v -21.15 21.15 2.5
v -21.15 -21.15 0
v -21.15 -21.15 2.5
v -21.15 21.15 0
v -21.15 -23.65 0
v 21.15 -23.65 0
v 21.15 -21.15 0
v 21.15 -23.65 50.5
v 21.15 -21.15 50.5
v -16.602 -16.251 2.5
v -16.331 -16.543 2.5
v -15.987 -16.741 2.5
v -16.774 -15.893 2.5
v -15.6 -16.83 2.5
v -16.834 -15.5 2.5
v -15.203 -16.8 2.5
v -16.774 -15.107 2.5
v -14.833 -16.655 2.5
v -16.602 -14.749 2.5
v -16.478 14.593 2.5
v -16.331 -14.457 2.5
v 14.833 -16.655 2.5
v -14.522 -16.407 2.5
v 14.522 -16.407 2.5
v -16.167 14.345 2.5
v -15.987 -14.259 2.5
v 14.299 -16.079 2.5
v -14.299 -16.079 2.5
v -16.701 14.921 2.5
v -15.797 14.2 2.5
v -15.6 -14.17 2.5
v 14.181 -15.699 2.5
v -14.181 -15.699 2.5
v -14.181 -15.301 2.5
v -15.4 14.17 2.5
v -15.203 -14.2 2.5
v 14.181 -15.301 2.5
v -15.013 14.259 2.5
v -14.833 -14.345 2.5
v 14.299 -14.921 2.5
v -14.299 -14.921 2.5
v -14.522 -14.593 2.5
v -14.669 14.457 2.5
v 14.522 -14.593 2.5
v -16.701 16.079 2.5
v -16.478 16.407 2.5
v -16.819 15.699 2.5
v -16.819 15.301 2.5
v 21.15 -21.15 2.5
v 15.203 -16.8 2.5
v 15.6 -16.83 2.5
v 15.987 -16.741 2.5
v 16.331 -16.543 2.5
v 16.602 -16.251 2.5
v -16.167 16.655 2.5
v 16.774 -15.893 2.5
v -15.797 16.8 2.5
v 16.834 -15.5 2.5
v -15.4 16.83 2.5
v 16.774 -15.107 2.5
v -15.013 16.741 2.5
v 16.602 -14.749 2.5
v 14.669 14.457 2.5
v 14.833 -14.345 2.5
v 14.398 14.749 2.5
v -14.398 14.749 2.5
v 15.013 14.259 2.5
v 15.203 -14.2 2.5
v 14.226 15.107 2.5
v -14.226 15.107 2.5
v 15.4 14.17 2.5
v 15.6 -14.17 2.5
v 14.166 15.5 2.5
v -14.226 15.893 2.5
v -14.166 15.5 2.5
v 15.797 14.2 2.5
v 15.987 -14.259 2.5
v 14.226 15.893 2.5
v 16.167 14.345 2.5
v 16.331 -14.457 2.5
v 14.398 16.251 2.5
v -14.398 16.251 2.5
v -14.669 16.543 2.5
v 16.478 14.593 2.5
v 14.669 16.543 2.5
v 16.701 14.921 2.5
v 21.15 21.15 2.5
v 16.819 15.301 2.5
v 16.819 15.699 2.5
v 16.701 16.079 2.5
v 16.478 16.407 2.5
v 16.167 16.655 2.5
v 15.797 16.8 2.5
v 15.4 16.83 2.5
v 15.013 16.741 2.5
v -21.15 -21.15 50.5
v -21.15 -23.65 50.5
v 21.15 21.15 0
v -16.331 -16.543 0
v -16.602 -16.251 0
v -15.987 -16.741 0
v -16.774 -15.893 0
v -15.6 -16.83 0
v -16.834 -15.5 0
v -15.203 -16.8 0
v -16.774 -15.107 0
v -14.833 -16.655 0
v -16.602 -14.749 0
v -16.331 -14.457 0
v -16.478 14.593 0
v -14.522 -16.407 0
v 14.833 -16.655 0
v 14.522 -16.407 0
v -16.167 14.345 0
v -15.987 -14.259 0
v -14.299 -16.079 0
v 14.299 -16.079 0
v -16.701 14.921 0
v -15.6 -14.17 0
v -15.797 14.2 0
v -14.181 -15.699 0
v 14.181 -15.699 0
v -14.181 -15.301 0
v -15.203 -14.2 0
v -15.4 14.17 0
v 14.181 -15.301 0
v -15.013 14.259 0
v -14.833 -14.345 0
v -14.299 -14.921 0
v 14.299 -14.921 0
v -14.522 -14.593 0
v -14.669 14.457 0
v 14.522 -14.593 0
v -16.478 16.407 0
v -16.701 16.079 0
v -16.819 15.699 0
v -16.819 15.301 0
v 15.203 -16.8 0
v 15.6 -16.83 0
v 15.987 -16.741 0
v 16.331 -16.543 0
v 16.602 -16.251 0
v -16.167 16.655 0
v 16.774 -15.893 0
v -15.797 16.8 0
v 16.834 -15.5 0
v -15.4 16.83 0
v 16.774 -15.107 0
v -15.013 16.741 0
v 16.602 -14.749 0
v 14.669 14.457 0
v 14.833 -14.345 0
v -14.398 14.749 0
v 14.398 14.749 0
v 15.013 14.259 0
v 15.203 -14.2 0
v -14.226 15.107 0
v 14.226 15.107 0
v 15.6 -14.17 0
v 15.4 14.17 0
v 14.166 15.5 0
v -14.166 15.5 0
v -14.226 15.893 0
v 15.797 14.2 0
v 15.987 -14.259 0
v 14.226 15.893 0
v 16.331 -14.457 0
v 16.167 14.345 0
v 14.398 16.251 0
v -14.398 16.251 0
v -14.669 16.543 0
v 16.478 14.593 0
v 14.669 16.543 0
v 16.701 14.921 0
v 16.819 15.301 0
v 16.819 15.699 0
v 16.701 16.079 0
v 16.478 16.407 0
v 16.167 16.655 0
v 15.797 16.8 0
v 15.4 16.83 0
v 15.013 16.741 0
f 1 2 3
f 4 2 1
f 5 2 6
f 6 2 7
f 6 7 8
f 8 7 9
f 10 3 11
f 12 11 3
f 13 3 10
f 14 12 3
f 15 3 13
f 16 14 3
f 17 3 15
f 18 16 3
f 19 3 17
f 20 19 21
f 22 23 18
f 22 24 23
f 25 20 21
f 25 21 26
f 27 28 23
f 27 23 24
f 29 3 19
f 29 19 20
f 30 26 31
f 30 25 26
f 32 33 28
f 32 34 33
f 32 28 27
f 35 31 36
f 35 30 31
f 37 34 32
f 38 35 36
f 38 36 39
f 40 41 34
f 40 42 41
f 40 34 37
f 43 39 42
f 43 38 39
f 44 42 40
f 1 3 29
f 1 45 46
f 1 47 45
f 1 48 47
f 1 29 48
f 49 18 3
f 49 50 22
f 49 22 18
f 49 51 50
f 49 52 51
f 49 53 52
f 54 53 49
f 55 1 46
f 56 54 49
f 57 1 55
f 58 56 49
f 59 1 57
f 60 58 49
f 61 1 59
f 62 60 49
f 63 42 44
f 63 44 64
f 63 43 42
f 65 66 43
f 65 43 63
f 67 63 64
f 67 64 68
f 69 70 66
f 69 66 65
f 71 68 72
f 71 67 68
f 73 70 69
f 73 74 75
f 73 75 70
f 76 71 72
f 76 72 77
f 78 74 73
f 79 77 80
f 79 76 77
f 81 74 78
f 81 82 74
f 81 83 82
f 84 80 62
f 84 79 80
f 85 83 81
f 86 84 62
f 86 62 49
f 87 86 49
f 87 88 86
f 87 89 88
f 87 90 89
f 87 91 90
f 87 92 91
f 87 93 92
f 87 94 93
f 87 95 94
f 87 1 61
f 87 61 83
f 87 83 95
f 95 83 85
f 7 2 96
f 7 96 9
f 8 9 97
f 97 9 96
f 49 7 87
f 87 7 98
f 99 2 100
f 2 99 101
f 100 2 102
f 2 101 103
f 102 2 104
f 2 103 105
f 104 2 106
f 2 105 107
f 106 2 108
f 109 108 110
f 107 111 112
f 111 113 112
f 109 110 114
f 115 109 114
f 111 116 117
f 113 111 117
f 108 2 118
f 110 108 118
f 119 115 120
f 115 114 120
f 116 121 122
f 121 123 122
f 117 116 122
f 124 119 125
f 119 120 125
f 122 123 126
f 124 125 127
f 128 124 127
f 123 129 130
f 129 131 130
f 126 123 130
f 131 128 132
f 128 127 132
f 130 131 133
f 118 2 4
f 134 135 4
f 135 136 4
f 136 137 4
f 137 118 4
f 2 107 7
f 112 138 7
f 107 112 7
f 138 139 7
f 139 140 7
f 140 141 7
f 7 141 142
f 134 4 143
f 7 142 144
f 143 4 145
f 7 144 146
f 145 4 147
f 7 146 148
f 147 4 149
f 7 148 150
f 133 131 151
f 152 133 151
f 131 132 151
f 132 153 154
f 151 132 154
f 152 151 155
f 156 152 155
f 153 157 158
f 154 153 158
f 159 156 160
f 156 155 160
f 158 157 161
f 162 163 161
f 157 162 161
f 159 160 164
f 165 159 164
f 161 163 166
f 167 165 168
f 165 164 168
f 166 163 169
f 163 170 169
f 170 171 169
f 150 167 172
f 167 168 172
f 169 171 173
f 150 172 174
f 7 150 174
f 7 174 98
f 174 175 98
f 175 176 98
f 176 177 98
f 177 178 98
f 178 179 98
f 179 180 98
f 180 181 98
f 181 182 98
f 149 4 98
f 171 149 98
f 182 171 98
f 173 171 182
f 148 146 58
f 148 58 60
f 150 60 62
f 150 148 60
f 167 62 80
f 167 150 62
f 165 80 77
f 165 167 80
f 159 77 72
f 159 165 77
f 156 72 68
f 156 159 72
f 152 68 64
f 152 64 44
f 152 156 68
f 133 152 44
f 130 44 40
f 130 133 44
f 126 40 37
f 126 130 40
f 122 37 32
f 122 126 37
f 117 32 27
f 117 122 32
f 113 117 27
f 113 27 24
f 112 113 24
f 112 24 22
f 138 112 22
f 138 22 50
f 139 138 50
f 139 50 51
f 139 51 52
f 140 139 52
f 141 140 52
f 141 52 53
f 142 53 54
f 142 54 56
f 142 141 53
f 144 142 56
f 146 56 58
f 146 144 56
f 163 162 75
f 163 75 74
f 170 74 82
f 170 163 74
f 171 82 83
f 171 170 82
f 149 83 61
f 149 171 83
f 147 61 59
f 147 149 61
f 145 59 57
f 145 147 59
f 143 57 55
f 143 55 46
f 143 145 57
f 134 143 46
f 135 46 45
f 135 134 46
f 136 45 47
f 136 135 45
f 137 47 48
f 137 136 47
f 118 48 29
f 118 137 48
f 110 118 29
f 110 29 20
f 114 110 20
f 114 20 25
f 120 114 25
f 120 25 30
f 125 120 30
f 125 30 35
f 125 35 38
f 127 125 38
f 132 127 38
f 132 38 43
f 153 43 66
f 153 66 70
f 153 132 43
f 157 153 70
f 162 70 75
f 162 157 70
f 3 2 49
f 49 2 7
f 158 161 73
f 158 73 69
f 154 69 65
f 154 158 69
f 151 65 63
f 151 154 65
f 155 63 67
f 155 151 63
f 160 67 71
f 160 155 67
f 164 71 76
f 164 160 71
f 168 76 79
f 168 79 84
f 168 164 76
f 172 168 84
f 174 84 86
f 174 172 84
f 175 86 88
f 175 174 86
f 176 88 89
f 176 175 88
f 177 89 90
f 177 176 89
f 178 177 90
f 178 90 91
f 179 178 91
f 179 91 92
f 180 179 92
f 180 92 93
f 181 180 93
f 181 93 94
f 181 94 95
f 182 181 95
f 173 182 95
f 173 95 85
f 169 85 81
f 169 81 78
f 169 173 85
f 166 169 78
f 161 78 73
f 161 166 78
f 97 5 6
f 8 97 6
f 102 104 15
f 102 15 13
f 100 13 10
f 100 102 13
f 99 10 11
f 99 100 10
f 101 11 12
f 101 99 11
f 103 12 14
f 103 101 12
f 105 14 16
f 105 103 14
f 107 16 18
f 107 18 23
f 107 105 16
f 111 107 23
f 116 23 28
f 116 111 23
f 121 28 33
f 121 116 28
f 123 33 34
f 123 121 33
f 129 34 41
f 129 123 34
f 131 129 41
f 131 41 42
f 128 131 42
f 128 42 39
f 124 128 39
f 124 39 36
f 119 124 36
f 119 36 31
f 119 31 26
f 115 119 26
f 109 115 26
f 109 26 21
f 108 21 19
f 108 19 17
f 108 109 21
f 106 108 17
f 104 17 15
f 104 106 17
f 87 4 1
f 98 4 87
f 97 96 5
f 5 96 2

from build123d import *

# Parameters (mm, degrees)
SKETCH2_W           = 42.3
SKETCH2_H           = 42.3
SKETCH2_R           = 1.3335
BOSS_EXTRUDE1_DEPTH = 2.5
BOSS_EXTRUDE2_DEPTH = 2.5


with BuildPart() as part:
    # Sketch2 → Boss-Extrude1 (new body)
    with BuildSketch(Plane.XY):
        Rectangle(SKETCH2_W, SKETCH2_H)
        with Locations((-15.5, 15.5)):
            Circle(SKETCH2_R, mode=Mode.SUBTRACT)
        with Locations(Location((15.5, 15.5, 0), (0, 0, 180))):
            Circle(SKETCH2_R, mode=Mode.SUBTRACT)
        with Locations((15.5, -15.5)):
            Circle(SKETCH2_R, mode=Mode.SUBTRACT)
        with Locations(Location((-15.5, -15.5, 0), (0, 0, 180))):
            Circle(SKETCH2_R, mode=Mode.SUBTRACT)
    extrude(amount=BOSS_EXTRUDE1_DEPTH)


with BuildPart() as body_2:
    # Sketch3 → Boss-Extrude2 (new body)
    with BuildSketch(Plane.XZ.offset(21.15)):
        Polygon((21.15, 2.5), (21.15, 50.5), (-21.15, 50.5), (-21.15, 2.5), (-21.15, 0), (21.15, 0), align=None)
    extrude(amount=BOSS_EXTRUDE2_DEPTH)


solid = Compound([part.part, body_2.part])
